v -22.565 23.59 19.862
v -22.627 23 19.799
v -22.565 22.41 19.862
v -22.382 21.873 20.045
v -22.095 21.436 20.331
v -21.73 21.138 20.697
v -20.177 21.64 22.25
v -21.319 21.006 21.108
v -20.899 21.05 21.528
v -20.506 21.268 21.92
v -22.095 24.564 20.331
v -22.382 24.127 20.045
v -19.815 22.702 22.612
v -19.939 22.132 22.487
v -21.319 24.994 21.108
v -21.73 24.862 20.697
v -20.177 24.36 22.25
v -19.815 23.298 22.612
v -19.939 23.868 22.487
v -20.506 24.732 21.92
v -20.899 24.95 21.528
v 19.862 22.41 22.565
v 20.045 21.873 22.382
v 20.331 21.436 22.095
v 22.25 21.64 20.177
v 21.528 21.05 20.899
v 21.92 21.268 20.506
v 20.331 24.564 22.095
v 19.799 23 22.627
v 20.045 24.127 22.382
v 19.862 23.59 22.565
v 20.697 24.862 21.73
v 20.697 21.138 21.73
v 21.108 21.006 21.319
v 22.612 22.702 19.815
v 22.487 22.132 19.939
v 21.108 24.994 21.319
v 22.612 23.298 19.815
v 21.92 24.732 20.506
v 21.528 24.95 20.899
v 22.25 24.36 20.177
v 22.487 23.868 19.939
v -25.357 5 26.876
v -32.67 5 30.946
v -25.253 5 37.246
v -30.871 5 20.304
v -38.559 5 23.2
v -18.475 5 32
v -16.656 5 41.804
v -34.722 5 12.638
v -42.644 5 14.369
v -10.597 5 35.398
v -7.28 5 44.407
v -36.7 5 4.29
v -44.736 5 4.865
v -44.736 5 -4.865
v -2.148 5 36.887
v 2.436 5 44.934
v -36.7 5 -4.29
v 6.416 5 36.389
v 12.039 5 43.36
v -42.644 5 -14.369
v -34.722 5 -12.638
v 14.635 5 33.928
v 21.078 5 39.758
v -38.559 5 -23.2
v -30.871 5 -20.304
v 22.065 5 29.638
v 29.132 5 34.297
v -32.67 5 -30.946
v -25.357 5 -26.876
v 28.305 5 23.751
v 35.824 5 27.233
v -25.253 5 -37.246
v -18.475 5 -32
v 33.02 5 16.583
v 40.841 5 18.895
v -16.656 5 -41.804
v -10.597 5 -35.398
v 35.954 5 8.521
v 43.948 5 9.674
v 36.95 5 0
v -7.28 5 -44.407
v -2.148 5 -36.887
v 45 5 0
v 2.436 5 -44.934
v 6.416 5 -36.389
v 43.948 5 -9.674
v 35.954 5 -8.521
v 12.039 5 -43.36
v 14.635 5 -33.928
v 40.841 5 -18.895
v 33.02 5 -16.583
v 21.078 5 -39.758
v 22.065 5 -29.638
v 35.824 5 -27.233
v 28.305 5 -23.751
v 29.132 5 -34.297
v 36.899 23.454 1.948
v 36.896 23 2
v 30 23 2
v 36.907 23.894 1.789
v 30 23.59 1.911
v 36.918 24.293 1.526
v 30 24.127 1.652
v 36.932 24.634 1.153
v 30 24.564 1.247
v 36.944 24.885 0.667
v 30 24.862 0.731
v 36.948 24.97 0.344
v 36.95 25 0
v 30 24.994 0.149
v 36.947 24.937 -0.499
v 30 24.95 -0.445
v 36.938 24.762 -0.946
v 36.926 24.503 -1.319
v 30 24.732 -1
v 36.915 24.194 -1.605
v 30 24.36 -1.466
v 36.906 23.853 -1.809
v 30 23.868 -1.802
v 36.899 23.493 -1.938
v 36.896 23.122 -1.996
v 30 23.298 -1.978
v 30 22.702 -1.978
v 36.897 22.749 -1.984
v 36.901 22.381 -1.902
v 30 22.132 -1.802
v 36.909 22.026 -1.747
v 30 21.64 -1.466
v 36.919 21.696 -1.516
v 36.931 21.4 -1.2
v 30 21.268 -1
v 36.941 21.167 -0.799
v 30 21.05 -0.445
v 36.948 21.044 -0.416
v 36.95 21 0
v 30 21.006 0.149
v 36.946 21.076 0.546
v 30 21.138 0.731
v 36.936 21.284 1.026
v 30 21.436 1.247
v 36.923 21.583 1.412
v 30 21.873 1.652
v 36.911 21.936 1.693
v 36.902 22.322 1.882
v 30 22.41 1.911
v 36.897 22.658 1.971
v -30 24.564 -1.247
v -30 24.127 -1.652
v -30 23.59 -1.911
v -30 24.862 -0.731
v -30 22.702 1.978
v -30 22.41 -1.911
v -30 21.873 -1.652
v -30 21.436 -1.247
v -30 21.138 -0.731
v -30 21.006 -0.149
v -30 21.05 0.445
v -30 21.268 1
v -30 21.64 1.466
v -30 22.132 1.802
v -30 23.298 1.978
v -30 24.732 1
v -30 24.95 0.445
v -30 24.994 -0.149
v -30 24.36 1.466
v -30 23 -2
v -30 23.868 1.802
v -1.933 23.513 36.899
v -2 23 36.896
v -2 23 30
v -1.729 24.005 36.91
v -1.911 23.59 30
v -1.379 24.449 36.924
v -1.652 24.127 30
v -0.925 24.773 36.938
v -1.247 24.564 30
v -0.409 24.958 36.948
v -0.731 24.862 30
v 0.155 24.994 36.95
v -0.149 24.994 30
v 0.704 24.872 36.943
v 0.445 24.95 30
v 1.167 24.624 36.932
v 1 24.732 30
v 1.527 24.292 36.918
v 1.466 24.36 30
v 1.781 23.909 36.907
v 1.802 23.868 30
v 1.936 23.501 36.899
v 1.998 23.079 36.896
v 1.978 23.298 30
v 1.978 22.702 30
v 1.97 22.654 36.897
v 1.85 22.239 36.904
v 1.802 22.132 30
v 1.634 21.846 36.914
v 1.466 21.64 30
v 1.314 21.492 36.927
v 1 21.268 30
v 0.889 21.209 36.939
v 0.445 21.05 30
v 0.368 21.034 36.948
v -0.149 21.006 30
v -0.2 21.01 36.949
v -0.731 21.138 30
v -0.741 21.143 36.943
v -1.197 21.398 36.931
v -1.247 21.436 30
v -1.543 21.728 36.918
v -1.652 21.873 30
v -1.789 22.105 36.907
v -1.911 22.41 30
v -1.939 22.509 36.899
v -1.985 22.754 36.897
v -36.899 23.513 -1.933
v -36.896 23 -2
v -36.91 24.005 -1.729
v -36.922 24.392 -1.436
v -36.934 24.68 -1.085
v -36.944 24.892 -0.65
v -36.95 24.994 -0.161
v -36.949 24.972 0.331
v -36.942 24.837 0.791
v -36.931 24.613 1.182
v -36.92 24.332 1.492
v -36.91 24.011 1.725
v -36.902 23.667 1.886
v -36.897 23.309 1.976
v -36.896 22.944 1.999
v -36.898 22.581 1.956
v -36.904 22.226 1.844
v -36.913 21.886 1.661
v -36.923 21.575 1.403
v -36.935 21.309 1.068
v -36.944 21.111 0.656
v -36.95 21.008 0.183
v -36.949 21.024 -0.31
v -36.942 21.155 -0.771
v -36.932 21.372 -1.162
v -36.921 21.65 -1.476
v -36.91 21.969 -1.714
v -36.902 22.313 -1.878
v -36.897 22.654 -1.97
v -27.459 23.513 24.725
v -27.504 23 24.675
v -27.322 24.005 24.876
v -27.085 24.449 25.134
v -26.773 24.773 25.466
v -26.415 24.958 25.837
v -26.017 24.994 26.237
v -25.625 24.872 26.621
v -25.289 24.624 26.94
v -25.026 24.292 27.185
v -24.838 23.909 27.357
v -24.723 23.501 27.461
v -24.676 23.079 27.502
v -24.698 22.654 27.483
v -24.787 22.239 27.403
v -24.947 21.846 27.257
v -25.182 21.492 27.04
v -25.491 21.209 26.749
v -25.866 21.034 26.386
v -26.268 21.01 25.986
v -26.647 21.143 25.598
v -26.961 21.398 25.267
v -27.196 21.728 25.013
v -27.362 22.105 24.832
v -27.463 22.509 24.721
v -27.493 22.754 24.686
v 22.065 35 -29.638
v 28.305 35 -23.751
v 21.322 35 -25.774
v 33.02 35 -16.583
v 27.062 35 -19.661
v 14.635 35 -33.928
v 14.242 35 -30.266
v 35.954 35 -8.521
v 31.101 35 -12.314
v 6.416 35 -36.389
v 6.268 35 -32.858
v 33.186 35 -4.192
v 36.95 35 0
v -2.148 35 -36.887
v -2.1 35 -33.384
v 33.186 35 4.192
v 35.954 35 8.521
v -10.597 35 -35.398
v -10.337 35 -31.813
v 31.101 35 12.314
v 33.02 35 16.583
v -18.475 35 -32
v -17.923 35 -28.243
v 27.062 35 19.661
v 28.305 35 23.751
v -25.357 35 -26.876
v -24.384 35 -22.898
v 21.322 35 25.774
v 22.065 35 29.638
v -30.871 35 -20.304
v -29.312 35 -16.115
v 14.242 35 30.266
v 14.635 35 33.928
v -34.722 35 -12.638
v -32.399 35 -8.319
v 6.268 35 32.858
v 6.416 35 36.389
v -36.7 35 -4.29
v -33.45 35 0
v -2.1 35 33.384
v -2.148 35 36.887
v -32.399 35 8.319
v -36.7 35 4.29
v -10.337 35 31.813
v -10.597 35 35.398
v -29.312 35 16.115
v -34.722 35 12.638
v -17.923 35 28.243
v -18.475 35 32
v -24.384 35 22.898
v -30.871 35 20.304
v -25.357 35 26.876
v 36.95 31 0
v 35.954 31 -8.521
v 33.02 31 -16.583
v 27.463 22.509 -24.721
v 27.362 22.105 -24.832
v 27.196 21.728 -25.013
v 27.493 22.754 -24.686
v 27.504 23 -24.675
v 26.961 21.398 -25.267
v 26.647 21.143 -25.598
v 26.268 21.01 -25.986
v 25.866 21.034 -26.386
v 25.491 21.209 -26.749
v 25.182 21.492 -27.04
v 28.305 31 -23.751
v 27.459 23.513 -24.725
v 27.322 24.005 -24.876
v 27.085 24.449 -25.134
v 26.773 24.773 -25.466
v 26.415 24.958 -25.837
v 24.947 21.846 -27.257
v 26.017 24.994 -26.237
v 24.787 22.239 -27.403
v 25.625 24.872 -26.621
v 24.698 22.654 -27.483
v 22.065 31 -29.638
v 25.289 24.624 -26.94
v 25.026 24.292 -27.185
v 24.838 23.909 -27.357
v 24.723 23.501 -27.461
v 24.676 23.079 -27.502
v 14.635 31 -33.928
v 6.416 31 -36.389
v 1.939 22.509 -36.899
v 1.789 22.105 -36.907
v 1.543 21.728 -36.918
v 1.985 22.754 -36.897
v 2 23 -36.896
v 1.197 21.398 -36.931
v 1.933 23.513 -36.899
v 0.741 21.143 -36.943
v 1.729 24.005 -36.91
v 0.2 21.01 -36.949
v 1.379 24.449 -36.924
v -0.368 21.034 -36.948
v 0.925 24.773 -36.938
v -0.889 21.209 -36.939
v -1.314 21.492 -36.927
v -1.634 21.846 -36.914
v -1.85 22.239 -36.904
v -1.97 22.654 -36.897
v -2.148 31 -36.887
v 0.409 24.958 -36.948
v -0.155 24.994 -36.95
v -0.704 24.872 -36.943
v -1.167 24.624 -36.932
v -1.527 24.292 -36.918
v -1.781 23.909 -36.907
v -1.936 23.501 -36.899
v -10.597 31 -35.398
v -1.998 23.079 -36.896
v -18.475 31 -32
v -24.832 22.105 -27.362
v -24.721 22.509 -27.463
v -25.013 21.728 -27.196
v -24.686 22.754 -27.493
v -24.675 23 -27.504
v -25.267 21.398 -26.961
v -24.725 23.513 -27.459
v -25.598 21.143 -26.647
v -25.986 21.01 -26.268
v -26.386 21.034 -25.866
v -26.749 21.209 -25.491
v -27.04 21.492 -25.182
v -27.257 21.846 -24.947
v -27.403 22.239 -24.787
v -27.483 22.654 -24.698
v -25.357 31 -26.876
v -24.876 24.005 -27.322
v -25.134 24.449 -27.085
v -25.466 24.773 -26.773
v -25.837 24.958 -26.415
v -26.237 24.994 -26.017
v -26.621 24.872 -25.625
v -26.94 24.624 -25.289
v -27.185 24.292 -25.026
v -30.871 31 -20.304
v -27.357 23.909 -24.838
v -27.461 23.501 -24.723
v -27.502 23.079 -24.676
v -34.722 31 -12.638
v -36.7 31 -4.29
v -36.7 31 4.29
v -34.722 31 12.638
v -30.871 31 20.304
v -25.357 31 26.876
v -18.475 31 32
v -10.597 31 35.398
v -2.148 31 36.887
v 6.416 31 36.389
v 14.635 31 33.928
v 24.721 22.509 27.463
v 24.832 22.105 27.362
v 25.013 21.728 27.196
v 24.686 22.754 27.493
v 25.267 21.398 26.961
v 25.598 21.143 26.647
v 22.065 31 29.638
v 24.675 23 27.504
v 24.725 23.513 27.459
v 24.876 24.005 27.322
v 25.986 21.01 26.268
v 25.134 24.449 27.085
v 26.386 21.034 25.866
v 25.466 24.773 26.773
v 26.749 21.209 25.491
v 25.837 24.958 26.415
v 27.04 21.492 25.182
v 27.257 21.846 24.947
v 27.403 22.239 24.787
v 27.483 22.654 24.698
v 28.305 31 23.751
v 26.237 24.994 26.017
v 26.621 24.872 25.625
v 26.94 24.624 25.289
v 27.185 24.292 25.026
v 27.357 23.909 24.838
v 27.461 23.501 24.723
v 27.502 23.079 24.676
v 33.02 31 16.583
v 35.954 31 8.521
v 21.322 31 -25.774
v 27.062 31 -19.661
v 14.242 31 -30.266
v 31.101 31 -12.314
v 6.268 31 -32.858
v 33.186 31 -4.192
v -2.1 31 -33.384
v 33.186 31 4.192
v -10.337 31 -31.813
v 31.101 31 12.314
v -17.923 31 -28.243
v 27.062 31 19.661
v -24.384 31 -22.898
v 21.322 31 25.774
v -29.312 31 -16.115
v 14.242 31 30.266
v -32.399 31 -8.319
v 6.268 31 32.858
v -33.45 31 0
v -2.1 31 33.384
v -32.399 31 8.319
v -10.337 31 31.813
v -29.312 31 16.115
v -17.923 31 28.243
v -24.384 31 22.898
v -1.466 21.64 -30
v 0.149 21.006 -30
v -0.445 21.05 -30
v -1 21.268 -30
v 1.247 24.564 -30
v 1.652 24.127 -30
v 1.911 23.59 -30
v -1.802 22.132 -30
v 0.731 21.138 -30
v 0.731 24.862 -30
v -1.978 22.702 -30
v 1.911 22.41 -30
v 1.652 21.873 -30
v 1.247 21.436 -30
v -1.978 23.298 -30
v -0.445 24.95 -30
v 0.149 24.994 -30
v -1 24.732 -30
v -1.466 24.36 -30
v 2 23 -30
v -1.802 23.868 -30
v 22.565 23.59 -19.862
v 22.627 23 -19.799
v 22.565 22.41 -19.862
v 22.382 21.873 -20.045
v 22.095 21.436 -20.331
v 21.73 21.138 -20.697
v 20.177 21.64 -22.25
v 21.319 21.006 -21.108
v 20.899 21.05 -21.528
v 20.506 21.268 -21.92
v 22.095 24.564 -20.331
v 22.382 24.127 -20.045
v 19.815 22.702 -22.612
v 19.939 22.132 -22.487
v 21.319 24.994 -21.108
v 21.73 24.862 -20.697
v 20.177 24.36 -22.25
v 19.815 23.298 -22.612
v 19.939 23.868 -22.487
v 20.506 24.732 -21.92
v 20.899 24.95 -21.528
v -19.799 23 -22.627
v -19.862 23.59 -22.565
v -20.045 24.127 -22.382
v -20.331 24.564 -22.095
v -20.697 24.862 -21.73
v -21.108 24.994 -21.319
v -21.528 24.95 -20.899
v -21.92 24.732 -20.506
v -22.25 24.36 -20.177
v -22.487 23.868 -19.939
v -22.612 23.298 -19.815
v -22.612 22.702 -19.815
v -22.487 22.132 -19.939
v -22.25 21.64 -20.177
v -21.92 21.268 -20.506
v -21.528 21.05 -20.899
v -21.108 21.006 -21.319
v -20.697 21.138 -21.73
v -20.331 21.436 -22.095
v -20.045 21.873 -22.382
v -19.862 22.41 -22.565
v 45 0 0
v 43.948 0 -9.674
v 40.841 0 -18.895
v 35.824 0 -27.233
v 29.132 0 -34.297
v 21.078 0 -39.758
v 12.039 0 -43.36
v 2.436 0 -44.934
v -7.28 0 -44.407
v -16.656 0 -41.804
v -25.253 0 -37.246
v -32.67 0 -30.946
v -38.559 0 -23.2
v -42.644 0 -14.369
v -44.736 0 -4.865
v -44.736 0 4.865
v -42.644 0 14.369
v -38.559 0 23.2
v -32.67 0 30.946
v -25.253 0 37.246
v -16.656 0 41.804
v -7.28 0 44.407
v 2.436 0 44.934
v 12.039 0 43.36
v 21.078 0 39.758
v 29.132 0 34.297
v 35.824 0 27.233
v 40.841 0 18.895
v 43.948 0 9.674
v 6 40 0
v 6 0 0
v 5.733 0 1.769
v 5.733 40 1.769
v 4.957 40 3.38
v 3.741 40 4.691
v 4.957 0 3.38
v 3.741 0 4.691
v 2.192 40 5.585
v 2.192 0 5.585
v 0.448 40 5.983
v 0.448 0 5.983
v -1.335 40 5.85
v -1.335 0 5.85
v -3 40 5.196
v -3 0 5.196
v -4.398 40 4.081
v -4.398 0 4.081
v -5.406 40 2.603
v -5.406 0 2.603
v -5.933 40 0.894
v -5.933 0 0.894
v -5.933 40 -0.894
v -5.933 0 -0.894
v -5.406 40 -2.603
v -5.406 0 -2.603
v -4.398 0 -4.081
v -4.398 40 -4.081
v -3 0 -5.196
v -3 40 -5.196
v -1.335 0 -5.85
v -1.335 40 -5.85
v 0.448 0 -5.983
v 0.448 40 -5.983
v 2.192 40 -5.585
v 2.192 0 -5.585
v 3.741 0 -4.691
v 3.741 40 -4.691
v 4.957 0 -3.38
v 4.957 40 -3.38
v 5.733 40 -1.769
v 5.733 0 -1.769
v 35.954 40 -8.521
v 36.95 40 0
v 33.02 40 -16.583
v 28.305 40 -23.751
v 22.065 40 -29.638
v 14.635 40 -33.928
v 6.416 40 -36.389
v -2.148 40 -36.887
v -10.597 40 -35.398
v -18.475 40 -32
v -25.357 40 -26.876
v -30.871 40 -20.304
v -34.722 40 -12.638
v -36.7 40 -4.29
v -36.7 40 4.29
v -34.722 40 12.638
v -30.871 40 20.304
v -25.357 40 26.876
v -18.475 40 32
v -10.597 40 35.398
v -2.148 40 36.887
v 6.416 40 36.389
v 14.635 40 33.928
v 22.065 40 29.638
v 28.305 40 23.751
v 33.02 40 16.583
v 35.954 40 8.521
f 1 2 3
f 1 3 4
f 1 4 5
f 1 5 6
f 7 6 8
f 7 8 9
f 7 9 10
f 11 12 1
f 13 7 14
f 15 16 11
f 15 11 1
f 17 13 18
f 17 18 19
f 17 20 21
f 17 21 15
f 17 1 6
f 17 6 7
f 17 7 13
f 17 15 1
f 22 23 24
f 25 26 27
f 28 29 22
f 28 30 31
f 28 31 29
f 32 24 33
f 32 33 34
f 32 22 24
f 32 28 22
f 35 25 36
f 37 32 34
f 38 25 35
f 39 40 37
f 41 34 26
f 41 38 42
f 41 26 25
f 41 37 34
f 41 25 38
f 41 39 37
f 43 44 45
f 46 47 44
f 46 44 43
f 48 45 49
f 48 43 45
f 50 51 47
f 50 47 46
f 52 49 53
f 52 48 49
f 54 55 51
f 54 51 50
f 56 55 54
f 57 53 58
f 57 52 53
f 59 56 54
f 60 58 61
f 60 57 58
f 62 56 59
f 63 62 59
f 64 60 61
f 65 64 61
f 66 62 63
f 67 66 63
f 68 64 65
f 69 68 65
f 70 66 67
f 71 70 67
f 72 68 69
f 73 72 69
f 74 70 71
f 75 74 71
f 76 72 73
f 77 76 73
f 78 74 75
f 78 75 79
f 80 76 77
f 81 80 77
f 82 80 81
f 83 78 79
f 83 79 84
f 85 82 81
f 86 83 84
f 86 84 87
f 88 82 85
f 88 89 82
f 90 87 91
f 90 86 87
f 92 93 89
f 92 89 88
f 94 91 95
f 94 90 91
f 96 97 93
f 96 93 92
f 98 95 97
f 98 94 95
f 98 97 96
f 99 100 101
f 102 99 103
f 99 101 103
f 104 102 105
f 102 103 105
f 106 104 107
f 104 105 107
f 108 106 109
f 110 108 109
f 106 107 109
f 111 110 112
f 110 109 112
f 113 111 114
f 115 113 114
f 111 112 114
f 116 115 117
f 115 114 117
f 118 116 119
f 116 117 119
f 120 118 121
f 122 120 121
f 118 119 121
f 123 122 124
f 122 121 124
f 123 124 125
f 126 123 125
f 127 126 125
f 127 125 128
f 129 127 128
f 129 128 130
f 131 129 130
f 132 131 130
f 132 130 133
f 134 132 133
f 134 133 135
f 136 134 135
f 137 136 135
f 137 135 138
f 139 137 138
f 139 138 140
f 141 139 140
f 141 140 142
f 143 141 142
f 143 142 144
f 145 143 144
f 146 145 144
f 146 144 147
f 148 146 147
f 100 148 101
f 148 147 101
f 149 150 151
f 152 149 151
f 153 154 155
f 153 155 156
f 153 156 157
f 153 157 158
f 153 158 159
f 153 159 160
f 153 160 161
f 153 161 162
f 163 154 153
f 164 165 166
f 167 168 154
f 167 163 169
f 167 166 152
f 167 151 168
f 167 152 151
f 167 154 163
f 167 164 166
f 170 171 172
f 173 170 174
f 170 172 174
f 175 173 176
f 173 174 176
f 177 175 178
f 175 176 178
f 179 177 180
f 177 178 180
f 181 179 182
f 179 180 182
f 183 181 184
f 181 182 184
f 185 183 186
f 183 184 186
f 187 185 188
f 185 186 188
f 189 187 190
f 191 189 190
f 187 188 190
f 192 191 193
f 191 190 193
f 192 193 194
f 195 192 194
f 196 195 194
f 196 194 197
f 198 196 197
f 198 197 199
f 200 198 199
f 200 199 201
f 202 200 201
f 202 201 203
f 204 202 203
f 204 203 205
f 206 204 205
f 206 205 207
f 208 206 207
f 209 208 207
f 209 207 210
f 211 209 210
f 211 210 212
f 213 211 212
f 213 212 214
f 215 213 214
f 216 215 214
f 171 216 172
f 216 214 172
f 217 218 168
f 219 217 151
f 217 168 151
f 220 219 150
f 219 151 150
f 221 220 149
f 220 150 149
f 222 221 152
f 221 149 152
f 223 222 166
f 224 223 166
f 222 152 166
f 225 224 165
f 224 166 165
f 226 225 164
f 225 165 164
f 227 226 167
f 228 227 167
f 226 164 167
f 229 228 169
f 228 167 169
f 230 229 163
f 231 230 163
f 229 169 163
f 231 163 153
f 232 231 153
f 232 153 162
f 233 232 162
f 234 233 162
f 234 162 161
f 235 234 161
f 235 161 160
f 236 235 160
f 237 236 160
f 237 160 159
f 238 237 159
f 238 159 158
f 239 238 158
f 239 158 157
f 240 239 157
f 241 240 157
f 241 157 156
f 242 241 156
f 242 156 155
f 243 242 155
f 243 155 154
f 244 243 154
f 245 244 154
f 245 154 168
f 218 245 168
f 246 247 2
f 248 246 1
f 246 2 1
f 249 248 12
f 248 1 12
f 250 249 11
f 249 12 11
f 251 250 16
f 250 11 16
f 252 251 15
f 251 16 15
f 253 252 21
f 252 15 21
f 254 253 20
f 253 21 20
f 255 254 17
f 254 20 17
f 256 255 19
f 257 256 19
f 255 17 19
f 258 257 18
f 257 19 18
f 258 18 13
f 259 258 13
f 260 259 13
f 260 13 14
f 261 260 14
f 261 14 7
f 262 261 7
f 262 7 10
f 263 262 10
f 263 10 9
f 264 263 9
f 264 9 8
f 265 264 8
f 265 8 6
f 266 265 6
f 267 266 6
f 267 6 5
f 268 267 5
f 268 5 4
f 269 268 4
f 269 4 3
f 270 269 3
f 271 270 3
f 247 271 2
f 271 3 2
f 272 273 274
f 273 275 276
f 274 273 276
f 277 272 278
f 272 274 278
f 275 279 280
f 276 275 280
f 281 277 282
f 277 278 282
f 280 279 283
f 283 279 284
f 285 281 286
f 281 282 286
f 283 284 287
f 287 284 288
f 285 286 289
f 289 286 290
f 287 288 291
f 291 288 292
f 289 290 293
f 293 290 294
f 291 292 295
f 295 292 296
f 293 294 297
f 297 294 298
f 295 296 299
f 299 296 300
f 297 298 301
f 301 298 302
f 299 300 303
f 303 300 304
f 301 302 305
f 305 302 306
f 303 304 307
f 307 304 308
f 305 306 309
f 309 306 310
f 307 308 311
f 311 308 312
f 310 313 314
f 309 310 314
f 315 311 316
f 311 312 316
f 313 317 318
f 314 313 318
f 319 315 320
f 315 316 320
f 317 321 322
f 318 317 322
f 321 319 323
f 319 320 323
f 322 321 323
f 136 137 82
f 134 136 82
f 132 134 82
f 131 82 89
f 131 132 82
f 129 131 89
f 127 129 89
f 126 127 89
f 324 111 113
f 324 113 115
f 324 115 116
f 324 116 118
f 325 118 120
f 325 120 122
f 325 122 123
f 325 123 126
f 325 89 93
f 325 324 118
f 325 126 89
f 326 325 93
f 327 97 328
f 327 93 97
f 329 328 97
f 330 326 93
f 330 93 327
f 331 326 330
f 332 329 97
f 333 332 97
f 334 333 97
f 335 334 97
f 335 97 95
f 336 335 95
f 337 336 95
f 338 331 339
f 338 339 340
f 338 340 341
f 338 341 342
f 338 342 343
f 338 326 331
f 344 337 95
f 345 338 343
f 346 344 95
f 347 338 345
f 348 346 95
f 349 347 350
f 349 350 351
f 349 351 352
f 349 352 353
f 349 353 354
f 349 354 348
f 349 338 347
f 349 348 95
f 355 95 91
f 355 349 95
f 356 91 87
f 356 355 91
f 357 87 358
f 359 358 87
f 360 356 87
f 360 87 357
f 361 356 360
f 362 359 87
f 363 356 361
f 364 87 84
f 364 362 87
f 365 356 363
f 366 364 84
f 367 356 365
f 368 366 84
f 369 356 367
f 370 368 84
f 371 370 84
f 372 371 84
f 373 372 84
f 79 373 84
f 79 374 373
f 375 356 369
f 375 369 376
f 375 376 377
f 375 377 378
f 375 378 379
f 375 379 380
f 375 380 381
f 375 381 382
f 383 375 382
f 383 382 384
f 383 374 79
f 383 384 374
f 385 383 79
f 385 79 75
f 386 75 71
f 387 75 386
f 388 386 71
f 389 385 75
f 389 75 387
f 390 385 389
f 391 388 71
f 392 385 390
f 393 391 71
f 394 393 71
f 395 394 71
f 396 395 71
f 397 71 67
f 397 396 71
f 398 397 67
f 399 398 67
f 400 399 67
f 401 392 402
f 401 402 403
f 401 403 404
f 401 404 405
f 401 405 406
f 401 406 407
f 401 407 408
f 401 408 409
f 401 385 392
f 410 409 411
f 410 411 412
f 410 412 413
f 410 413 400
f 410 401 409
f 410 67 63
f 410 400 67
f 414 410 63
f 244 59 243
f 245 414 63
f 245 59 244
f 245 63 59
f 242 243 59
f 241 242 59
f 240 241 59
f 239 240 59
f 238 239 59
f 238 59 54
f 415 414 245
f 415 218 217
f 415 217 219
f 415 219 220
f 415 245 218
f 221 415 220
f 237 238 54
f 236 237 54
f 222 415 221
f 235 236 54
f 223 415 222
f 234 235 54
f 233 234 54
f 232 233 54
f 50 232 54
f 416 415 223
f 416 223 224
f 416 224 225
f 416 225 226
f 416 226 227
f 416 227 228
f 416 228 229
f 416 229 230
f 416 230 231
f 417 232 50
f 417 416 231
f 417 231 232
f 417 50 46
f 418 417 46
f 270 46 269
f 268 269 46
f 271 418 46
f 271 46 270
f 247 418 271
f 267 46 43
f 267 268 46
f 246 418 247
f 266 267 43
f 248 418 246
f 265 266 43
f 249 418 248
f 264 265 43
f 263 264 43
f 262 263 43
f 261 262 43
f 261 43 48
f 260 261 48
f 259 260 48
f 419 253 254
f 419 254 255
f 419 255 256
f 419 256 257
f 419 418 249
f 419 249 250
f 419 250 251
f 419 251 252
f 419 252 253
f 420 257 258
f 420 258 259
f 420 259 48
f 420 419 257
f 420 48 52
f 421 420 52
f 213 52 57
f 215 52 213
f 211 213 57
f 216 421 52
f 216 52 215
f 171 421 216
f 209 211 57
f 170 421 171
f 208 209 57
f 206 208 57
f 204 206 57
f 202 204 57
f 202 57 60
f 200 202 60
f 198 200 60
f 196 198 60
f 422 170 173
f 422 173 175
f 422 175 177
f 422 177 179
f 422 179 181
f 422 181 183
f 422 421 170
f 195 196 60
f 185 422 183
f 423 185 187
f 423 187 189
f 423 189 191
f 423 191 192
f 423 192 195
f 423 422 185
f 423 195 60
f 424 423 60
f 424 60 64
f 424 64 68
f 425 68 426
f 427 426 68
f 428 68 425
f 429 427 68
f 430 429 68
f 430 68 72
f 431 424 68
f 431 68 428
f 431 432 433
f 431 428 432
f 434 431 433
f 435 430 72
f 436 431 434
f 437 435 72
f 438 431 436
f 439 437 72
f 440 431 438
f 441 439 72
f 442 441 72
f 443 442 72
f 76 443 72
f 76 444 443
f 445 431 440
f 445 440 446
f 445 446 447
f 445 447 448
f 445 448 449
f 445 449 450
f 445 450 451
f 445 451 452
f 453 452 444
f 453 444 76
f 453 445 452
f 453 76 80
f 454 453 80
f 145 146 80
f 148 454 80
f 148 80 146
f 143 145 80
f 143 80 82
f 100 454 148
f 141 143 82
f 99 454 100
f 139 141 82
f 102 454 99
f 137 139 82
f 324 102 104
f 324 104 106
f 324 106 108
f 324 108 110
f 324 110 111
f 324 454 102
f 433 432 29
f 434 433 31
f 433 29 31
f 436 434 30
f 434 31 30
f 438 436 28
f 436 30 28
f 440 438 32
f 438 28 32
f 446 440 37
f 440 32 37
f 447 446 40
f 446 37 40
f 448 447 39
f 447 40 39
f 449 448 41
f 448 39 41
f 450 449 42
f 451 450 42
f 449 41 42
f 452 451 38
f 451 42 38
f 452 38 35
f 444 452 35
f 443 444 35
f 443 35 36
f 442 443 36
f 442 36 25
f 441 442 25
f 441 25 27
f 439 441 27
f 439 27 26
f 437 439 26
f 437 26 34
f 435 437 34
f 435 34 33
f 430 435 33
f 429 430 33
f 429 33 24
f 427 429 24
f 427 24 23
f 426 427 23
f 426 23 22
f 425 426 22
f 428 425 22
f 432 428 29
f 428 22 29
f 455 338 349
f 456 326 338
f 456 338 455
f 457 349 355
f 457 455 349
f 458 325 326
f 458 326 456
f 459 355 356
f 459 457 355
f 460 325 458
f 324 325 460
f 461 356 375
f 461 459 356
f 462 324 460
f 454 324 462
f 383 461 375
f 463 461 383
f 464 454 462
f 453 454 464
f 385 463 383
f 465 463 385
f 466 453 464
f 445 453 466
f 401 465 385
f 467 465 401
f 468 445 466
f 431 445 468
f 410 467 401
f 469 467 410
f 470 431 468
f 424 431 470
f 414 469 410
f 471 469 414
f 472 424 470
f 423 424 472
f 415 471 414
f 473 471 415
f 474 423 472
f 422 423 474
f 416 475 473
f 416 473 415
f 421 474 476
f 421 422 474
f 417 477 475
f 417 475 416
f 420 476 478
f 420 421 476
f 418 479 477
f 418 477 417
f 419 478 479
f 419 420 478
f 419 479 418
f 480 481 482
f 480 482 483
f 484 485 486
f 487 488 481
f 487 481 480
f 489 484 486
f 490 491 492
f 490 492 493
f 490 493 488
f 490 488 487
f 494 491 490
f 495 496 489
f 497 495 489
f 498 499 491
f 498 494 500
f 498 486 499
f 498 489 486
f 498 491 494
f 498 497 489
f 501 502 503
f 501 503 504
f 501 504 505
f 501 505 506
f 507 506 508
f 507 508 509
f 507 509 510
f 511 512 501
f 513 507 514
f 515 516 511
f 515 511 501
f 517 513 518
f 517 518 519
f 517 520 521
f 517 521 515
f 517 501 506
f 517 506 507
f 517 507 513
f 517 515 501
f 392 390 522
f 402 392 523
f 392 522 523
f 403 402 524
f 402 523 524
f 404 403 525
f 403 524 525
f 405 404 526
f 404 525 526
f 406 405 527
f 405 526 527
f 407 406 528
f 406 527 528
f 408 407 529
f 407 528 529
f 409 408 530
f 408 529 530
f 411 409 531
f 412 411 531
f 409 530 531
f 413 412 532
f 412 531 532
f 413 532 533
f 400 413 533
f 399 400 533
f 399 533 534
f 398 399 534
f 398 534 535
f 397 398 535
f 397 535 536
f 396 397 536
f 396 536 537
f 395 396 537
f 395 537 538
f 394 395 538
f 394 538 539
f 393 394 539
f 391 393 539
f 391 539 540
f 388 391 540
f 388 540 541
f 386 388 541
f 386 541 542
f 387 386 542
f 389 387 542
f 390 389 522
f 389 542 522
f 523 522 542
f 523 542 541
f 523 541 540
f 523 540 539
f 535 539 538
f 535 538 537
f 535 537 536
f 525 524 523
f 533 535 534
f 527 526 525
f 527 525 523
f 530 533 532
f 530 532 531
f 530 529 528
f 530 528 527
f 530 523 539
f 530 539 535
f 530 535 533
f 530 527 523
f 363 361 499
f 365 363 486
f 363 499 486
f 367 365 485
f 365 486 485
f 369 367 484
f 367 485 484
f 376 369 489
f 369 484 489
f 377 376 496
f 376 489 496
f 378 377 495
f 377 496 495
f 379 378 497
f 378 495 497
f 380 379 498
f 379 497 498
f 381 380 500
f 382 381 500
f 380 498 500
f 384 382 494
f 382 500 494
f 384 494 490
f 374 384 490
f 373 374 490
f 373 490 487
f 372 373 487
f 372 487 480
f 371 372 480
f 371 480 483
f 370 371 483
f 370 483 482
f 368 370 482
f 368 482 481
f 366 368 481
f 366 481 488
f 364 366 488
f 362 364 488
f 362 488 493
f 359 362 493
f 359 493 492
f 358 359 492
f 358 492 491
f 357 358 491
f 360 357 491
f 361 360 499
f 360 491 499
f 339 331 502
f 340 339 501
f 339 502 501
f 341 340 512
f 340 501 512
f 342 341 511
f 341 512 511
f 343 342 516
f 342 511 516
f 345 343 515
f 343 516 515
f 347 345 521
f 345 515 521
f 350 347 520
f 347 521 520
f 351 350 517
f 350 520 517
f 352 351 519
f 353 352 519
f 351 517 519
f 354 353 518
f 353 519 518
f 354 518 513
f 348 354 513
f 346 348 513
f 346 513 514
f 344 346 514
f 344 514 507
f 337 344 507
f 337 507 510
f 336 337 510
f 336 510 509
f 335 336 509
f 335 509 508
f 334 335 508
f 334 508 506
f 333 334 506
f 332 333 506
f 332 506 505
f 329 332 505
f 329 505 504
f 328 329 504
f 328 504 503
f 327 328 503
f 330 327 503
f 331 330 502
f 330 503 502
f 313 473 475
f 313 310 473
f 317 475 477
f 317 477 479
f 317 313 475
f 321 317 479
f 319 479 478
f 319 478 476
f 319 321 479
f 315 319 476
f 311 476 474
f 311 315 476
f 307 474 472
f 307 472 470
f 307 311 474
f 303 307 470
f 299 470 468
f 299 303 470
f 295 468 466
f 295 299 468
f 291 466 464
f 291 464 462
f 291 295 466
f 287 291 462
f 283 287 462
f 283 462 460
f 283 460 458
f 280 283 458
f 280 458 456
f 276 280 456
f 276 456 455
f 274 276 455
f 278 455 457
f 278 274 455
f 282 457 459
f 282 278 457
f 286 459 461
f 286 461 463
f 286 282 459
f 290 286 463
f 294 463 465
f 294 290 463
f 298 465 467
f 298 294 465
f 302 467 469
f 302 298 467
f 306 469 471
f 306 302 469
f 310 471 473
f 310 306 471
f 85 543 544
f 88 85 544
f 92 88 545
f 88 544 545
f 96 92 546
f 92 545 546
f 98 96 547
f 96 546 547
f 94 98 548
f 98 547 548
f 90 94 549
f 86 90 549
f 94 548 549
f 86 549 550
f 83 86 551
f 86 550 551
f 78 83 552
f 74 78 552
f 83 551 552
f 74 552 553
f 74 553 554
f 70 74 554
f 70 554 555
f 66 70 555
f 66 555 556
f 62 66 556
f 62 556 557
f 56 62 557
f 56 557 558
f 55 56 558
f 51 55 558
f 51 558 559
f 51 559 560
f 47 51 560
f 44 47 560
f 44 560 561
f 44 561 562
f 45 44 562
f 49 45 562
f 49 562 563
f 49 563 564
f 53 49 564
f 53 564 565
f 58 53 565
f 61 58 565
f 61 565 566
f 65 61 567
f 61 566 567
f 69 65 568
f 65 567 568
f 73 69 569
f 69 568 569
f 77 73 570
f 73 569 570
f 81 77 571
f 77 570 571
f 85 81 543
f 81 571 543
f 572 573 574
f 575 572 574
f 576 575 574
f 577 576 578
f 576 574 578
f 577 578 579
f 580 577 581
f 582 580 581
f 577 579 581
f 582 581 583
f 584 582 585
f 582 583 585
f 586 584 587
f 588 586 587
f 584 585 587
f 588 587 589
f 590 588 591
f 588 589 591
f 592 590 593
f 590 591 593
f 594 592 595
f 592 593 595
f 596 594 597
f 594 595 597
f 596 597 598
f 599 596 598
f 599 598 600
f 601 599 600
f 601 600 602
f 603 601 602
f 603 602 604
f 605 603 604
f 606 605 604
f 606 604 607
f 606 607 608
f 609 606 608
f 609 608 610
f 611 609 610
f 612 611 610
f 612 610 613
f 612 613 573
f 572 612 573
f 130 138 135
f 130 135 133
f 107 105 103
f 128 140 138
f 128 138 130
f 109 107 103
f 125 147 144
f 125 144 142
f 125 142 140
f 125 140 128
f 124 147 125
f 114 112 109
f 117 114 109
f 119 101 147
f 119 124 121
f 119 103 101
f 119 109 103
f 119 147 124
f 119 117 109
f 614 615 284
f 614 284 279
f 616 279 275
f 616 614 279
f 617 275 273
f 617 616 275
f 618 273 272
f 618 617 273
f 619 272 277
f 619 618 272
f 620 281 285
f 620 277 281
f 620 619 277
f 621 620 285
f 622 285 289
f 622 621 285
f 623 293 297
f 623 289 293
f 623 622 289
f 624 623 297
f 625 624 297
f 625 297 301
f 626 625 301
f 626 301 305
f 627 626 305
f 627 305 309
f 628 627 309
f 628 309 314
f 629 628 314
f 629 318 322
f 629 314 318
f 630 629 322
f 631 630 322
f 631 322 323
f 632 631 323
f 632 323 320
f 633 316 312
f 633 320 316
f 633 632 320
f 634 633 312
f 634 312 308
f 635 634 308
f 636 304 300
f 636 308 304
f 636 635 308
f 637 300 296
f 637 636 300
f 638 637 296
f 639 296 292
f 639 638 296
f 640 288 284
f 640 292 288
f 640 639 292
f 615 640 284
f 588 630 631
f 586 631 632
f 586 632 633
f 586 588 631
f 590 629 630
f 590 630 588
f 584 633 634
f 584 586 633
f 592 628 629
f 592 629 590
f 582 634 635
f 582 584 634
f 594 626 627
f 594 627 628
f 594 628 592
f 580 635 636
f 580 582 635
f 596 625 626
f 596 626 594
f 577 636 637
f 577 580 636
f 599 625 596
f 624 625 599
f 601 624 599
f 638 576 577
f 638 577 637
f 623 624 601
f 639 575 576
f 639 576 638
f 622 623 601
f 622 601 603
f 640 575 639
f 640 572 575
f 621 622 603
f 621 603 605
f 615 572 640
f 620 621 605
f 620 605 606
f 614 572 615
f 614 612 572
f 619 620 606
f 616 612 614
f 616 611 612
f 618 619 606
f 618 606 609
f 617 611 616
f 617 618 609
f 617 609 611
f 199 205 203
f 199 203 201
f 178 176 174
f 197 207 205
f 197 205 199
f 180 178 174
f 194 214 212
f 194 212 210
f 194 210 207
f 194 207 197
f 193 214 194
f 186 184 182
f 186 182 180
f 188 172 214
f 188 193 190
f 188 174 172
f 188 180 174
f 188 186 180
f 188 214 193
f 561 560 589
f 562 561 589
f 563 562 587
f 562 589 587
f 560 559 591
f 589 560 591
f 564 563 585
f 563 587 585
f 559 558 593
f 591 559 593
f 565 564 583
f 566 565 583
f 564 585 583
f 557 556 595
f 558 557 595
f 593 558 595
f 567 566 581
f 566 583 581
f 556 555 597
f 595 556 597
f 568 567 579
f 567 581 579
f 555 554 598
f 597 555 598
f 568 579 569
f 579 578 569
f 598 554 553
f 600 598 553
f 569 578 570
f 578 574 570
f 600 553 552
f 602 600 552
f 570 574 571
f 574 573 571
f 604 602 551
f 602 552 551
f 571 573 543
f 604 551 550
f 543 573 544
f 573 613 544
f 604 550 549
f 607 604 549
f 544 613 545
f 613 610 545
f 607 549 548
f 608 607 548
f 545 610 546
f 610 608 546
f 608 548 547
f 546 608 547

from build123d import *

# Parameters (mm, degrees)
SKETCH1_R           = 45
BOSS_EXTRUDE1_DEPTH = 40
SKETCH2_R           = 45
SKETCH2_R_2         = 36.95
CUT_EXTRUDE1_DEPTH  = 35
SKETCH5_W           = 3.5
SKETCH5_H           = 4
SKETCH6_R           = 2
CUT_EXTRUDE4_DEPTH  = 46
SKETCH8_R           = 2
BOSS_EXTRUDE2_DEPTH = 30
CIRPATTERN1_COUNT   = 8
SKETCH4_R           = 6
CUT_EXTRUDE3_DEPTH  = 77


with BuildPart() as part:
    # Sketch1 → Boss-Extrude1 (new body)
    with BuildSketch(Plane(origin=(0, 0, 0), x_dir=(1, 0, 0), z_dir=(0, 1, 0))):
        Circle(SKETCH1_R)
    extrude(amount=BOSS_EXTRUDE1_DEPTH)

    # Sketch2 → Cut-Extrude1 (cut)
    with BuildSketch(Plane(origin=(0, 40, 0), x_dir=(1, 0, 0), z_dir=(0, 1, 0))):
        Circle(SKETCH2_R)
        Circle(SKETCH2_R_2, mode=Mode.SUBTRACT)
    extrude(amount=-CUT_EXTRUDE1_DEPTH, mode=Mode.SUBTRACT)

    # Sketch5 → Cut-Revolve1 (revolve, cut)
    with BuildSketch(Plane.XY):
        with Locations((-35.2, 33)):
            Rectangle(SKETCH5_W, SKETCH5_H)
    revolve(axis=Axis((0, 0, 0), (0, 1, 0)), mode=Mode.SUBTRACT)

    # Sketch6 → Cut-Extrude4 (cut)
    with BuildSketch(Plane.XY):
        with Locations((0, 23)):
            Circle(SKETCH6_R)
    cut_extrude4 = extrude(amount=-CUT_EXTRUDE4_DEPTH, mode=Mode.SUBTRACT)

    # Sketch8 → Boss-Extrude2 (add)
    with BuildSketch(Plane(origin=(0, 0, 0), x_dir=(-1, 0, 0), z_dir=(0, 0, -1))):
        with Locations((0, 23)):
            Circle(SKETCH8_R)
    boss_extrude2 = extrude(amount=BOSS_EXTRUDE2_DEPTH)

    # CirPattern1: Cut-Extrude4, Boss-Extrude2 ×8 about axis
    cirpattern1_axis = Axis((0, 0, 0), (0, 1, 0))
    for i in range(1, CIRPATTERN1_COUNT):
        add(cut_extrude4.rotate(cirpattern1_axis, i * 360 / CIRPATTERN1_COUNT), mode=Mode.SUBTRACT)
        add(boss_extrude2.rotate(cirpattern1_axis, i * 360 / CIRPATTERN1_COUNT))

    # Sketch4 → Cut-Extrude3 (cut)
    with BuildSketch(Plane.XZ):
        Circle(SKETCH4_R)
    extrude(amount=-CUT_EXTRUDE3_DEPTH, mode=Mode.SUBTRACT)


solid = part.part
